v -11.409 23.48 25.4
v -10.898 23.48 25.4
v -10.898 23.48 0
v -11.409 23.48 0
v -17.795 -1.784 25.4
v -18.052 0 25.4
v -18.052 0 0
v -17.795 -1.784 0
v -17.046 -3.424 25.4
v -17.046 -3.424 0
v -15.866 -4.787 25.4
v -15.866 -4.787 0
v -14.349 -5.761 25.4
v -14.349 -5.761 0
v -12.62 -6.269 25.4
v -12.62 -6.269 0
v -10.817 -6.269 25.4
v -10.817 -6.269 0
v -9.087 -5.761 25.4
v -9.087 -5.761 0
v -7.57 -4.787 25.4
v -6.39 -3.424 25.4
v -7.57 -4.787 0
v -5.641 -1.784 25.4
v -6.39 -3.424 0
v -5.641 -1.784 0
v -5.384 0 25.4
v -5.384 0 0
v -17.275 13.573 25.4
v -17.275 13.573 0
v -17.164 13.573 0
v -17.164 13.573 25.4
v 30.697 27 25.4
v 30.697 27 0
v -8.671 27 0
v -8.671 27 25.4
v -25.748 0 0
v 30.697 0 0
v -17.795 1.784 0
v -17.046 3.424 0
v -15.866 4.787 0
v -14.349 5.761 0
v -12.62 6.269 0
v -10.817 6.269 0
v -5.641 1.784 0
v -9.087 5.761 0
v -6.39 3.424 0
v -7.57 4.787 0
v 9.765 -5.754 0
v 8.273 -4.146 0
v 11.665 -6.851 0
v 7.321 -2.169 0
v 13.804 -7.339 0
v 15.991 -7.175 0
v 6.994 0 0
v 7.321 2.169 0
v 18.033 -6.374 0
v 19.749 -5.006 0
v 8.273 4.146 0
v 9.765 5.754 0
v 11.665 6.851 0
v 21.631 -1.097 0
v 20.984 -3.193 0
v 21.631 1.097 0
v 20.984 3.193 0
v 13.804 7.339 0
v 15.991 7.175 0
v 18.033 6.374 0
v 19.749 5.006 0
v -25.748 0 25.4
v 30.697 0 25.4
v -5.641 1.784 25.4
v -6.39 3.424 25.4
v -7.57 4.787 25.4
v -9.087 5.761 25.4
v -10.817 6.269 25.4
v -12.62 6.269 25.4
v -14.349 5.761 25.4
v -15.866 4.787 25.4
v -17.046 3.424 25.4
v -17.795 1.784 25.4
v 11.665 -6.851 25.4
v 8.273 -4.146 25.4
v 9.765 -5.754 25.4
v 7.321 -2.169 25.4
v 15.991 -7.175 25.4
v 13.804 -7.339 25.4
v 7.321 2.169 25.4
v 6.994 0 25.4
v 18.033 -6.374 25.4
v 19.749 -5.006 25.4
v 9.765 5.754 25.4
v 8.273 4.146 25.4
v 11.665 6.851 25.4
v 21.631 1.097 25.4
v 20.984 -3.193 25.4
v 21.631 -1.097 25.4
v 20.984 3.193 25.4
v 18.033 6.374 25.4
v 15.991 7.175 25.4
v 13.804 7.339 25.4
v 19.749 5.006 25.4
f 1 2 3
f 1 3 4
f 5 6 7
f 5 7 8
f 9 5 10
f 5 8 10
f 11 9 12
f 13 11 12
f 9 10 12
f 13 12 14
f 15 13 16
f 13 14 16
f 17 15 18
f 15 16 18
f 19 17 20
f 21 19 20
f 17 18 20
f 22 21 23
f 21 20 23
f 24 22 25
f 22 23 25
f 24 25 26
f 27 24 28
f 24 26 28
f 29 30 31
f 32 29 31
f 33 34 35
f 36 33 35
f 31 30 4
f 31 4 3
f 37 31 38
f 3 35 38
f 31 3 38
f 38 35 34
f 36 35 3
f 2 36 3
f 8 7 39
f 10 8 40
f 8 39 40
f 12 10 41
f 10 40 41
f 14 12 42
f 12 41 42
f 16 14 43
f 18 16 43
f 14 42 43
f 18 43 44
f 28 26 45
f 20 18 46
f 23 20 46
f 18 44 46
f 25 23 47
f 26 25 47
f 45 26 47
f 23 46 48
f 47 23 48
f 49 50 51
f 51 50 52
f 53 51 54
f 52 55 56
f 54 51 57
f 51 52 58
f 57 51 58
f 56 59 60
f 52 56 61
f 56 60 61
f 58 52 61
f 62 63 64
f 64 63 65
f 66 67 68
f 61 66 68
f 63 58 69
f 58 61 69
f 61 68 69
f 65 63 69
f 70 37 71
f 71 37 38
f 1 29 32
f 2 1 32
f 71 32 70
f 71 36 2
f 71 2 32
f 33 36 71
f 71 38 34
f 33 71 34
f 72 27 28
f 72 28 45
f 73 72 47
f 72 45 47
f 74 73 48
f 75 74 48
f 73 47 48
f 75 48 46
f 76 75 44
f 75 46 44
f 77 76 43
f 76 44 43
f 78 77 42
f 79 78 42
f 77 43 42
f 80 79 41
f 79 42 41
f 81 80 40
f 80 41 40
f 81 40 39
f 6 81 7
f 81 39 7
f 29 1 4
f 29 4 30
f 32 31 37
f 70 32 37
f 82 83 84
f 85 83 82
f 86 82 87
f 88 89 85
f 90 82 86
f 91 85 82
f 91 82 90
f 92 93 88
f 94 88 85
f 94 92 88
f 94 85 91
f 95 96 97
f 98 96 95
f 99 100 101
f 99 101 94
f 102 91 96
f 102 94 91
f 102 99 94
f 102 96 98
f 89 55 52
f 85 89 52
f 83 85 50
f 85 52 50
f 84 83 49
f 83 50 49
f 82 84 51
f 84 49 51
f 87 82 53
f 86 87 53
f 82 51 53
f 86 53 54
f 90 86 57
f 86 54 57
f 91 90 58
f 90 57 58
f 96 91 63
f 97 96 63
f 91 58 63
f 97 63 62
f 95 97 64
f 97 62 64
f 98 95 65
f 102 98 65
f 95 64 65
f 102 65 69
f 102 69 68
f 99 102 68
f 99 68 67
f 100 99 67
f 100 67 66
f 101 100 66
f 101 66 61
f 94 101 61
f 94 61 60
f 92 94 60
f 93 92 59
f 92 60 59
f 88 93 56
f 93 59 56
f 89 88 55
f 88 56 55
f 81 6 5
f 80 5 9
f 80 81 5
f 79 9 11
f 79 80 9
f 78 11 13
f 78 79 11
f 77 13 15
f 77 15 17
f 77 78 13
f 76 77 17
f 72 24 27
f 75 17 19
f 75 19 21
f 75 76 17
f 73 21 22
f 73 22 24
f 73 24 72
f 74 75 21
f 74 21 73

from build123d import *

# Parameters (mm, degrees)
F2_DEPTH = 25.4
F4_DEPTH = 25.4


with BuildPart() as f2:
    # F0 (on Top) → F2 (new body)
    with BuildSketch(Plane.XY):
        with BuildLine():
            ThreePointArc((-18.0518868453, 0), (-11.7181707174, -6.3337161279), (-5.3844545894, 0))
            Line((-5.3844545894, 0), (-18.0518868453, 0))
        make_face()
        with BuildLine():
            Line((-18.0518868453, 0), (-5.3844545894, 0))
            ThreePointArc((-5.3844545894, 0), (-11.7181707174, 6.3337161279), (-18.0518868453, 0))
        make_face()
    extrude(amount=F2_DEPTH)


with BuildPart() as f2b:
    # F0 (on Top) → F2, piece 2 (new body)
    with BuildSketch(Plane.XY):
        with BuildLine():
            Line((6.9938381141, 0), (21.7132452005, 0))
            ThreePointArc((21.7132452005, 0), (14.3535416573, 7.3597035432), (6.9938381141, 0))
        make_face()
        with BuildLine():
            ThreePointArc((6.9938381141, 0), (14.3535416573, -7.3597035432), (21.7132452005, 0))
            Line((21.7132452005, 0), (6.9938381141, 0))
        make_face()
    extrude(amount=F2_DEPTH)


with BuildPart() as f4:
    # F3 (on face) → F4 (new body)
    with BuildSketch(Plane.XY):
        Polygon((-17.1637815215, 13.5726276785), (-6.5856352448, 13.5726276785), (-6.5856352448, 23.4798770398), (-10.8975384576, 23.4798770398), align=None)
        Polygon((-6.5856352448, 23.4798770398), (-6.5856352448, 13.5726276785), (-17.1637815215, 13.5726276785), (-25.7483422756, 0), (30.6969136, 0), (30.6969136, 26.9995592535), (-8.6713721976, 26.9995592535), (-10.8975384576, 23.4798770398), align=None)
        Polygon((-17.275037244, 13.5726276785), (-17.1637815215, 13.5726276785), (-10.8975384576, 23.4798770398), (-11.4089017734, 23.4798770398), align=None)
    extrude(amount=F4_DEPTH)


solid = Compound([f2.part, f2b.part, f4.part])
